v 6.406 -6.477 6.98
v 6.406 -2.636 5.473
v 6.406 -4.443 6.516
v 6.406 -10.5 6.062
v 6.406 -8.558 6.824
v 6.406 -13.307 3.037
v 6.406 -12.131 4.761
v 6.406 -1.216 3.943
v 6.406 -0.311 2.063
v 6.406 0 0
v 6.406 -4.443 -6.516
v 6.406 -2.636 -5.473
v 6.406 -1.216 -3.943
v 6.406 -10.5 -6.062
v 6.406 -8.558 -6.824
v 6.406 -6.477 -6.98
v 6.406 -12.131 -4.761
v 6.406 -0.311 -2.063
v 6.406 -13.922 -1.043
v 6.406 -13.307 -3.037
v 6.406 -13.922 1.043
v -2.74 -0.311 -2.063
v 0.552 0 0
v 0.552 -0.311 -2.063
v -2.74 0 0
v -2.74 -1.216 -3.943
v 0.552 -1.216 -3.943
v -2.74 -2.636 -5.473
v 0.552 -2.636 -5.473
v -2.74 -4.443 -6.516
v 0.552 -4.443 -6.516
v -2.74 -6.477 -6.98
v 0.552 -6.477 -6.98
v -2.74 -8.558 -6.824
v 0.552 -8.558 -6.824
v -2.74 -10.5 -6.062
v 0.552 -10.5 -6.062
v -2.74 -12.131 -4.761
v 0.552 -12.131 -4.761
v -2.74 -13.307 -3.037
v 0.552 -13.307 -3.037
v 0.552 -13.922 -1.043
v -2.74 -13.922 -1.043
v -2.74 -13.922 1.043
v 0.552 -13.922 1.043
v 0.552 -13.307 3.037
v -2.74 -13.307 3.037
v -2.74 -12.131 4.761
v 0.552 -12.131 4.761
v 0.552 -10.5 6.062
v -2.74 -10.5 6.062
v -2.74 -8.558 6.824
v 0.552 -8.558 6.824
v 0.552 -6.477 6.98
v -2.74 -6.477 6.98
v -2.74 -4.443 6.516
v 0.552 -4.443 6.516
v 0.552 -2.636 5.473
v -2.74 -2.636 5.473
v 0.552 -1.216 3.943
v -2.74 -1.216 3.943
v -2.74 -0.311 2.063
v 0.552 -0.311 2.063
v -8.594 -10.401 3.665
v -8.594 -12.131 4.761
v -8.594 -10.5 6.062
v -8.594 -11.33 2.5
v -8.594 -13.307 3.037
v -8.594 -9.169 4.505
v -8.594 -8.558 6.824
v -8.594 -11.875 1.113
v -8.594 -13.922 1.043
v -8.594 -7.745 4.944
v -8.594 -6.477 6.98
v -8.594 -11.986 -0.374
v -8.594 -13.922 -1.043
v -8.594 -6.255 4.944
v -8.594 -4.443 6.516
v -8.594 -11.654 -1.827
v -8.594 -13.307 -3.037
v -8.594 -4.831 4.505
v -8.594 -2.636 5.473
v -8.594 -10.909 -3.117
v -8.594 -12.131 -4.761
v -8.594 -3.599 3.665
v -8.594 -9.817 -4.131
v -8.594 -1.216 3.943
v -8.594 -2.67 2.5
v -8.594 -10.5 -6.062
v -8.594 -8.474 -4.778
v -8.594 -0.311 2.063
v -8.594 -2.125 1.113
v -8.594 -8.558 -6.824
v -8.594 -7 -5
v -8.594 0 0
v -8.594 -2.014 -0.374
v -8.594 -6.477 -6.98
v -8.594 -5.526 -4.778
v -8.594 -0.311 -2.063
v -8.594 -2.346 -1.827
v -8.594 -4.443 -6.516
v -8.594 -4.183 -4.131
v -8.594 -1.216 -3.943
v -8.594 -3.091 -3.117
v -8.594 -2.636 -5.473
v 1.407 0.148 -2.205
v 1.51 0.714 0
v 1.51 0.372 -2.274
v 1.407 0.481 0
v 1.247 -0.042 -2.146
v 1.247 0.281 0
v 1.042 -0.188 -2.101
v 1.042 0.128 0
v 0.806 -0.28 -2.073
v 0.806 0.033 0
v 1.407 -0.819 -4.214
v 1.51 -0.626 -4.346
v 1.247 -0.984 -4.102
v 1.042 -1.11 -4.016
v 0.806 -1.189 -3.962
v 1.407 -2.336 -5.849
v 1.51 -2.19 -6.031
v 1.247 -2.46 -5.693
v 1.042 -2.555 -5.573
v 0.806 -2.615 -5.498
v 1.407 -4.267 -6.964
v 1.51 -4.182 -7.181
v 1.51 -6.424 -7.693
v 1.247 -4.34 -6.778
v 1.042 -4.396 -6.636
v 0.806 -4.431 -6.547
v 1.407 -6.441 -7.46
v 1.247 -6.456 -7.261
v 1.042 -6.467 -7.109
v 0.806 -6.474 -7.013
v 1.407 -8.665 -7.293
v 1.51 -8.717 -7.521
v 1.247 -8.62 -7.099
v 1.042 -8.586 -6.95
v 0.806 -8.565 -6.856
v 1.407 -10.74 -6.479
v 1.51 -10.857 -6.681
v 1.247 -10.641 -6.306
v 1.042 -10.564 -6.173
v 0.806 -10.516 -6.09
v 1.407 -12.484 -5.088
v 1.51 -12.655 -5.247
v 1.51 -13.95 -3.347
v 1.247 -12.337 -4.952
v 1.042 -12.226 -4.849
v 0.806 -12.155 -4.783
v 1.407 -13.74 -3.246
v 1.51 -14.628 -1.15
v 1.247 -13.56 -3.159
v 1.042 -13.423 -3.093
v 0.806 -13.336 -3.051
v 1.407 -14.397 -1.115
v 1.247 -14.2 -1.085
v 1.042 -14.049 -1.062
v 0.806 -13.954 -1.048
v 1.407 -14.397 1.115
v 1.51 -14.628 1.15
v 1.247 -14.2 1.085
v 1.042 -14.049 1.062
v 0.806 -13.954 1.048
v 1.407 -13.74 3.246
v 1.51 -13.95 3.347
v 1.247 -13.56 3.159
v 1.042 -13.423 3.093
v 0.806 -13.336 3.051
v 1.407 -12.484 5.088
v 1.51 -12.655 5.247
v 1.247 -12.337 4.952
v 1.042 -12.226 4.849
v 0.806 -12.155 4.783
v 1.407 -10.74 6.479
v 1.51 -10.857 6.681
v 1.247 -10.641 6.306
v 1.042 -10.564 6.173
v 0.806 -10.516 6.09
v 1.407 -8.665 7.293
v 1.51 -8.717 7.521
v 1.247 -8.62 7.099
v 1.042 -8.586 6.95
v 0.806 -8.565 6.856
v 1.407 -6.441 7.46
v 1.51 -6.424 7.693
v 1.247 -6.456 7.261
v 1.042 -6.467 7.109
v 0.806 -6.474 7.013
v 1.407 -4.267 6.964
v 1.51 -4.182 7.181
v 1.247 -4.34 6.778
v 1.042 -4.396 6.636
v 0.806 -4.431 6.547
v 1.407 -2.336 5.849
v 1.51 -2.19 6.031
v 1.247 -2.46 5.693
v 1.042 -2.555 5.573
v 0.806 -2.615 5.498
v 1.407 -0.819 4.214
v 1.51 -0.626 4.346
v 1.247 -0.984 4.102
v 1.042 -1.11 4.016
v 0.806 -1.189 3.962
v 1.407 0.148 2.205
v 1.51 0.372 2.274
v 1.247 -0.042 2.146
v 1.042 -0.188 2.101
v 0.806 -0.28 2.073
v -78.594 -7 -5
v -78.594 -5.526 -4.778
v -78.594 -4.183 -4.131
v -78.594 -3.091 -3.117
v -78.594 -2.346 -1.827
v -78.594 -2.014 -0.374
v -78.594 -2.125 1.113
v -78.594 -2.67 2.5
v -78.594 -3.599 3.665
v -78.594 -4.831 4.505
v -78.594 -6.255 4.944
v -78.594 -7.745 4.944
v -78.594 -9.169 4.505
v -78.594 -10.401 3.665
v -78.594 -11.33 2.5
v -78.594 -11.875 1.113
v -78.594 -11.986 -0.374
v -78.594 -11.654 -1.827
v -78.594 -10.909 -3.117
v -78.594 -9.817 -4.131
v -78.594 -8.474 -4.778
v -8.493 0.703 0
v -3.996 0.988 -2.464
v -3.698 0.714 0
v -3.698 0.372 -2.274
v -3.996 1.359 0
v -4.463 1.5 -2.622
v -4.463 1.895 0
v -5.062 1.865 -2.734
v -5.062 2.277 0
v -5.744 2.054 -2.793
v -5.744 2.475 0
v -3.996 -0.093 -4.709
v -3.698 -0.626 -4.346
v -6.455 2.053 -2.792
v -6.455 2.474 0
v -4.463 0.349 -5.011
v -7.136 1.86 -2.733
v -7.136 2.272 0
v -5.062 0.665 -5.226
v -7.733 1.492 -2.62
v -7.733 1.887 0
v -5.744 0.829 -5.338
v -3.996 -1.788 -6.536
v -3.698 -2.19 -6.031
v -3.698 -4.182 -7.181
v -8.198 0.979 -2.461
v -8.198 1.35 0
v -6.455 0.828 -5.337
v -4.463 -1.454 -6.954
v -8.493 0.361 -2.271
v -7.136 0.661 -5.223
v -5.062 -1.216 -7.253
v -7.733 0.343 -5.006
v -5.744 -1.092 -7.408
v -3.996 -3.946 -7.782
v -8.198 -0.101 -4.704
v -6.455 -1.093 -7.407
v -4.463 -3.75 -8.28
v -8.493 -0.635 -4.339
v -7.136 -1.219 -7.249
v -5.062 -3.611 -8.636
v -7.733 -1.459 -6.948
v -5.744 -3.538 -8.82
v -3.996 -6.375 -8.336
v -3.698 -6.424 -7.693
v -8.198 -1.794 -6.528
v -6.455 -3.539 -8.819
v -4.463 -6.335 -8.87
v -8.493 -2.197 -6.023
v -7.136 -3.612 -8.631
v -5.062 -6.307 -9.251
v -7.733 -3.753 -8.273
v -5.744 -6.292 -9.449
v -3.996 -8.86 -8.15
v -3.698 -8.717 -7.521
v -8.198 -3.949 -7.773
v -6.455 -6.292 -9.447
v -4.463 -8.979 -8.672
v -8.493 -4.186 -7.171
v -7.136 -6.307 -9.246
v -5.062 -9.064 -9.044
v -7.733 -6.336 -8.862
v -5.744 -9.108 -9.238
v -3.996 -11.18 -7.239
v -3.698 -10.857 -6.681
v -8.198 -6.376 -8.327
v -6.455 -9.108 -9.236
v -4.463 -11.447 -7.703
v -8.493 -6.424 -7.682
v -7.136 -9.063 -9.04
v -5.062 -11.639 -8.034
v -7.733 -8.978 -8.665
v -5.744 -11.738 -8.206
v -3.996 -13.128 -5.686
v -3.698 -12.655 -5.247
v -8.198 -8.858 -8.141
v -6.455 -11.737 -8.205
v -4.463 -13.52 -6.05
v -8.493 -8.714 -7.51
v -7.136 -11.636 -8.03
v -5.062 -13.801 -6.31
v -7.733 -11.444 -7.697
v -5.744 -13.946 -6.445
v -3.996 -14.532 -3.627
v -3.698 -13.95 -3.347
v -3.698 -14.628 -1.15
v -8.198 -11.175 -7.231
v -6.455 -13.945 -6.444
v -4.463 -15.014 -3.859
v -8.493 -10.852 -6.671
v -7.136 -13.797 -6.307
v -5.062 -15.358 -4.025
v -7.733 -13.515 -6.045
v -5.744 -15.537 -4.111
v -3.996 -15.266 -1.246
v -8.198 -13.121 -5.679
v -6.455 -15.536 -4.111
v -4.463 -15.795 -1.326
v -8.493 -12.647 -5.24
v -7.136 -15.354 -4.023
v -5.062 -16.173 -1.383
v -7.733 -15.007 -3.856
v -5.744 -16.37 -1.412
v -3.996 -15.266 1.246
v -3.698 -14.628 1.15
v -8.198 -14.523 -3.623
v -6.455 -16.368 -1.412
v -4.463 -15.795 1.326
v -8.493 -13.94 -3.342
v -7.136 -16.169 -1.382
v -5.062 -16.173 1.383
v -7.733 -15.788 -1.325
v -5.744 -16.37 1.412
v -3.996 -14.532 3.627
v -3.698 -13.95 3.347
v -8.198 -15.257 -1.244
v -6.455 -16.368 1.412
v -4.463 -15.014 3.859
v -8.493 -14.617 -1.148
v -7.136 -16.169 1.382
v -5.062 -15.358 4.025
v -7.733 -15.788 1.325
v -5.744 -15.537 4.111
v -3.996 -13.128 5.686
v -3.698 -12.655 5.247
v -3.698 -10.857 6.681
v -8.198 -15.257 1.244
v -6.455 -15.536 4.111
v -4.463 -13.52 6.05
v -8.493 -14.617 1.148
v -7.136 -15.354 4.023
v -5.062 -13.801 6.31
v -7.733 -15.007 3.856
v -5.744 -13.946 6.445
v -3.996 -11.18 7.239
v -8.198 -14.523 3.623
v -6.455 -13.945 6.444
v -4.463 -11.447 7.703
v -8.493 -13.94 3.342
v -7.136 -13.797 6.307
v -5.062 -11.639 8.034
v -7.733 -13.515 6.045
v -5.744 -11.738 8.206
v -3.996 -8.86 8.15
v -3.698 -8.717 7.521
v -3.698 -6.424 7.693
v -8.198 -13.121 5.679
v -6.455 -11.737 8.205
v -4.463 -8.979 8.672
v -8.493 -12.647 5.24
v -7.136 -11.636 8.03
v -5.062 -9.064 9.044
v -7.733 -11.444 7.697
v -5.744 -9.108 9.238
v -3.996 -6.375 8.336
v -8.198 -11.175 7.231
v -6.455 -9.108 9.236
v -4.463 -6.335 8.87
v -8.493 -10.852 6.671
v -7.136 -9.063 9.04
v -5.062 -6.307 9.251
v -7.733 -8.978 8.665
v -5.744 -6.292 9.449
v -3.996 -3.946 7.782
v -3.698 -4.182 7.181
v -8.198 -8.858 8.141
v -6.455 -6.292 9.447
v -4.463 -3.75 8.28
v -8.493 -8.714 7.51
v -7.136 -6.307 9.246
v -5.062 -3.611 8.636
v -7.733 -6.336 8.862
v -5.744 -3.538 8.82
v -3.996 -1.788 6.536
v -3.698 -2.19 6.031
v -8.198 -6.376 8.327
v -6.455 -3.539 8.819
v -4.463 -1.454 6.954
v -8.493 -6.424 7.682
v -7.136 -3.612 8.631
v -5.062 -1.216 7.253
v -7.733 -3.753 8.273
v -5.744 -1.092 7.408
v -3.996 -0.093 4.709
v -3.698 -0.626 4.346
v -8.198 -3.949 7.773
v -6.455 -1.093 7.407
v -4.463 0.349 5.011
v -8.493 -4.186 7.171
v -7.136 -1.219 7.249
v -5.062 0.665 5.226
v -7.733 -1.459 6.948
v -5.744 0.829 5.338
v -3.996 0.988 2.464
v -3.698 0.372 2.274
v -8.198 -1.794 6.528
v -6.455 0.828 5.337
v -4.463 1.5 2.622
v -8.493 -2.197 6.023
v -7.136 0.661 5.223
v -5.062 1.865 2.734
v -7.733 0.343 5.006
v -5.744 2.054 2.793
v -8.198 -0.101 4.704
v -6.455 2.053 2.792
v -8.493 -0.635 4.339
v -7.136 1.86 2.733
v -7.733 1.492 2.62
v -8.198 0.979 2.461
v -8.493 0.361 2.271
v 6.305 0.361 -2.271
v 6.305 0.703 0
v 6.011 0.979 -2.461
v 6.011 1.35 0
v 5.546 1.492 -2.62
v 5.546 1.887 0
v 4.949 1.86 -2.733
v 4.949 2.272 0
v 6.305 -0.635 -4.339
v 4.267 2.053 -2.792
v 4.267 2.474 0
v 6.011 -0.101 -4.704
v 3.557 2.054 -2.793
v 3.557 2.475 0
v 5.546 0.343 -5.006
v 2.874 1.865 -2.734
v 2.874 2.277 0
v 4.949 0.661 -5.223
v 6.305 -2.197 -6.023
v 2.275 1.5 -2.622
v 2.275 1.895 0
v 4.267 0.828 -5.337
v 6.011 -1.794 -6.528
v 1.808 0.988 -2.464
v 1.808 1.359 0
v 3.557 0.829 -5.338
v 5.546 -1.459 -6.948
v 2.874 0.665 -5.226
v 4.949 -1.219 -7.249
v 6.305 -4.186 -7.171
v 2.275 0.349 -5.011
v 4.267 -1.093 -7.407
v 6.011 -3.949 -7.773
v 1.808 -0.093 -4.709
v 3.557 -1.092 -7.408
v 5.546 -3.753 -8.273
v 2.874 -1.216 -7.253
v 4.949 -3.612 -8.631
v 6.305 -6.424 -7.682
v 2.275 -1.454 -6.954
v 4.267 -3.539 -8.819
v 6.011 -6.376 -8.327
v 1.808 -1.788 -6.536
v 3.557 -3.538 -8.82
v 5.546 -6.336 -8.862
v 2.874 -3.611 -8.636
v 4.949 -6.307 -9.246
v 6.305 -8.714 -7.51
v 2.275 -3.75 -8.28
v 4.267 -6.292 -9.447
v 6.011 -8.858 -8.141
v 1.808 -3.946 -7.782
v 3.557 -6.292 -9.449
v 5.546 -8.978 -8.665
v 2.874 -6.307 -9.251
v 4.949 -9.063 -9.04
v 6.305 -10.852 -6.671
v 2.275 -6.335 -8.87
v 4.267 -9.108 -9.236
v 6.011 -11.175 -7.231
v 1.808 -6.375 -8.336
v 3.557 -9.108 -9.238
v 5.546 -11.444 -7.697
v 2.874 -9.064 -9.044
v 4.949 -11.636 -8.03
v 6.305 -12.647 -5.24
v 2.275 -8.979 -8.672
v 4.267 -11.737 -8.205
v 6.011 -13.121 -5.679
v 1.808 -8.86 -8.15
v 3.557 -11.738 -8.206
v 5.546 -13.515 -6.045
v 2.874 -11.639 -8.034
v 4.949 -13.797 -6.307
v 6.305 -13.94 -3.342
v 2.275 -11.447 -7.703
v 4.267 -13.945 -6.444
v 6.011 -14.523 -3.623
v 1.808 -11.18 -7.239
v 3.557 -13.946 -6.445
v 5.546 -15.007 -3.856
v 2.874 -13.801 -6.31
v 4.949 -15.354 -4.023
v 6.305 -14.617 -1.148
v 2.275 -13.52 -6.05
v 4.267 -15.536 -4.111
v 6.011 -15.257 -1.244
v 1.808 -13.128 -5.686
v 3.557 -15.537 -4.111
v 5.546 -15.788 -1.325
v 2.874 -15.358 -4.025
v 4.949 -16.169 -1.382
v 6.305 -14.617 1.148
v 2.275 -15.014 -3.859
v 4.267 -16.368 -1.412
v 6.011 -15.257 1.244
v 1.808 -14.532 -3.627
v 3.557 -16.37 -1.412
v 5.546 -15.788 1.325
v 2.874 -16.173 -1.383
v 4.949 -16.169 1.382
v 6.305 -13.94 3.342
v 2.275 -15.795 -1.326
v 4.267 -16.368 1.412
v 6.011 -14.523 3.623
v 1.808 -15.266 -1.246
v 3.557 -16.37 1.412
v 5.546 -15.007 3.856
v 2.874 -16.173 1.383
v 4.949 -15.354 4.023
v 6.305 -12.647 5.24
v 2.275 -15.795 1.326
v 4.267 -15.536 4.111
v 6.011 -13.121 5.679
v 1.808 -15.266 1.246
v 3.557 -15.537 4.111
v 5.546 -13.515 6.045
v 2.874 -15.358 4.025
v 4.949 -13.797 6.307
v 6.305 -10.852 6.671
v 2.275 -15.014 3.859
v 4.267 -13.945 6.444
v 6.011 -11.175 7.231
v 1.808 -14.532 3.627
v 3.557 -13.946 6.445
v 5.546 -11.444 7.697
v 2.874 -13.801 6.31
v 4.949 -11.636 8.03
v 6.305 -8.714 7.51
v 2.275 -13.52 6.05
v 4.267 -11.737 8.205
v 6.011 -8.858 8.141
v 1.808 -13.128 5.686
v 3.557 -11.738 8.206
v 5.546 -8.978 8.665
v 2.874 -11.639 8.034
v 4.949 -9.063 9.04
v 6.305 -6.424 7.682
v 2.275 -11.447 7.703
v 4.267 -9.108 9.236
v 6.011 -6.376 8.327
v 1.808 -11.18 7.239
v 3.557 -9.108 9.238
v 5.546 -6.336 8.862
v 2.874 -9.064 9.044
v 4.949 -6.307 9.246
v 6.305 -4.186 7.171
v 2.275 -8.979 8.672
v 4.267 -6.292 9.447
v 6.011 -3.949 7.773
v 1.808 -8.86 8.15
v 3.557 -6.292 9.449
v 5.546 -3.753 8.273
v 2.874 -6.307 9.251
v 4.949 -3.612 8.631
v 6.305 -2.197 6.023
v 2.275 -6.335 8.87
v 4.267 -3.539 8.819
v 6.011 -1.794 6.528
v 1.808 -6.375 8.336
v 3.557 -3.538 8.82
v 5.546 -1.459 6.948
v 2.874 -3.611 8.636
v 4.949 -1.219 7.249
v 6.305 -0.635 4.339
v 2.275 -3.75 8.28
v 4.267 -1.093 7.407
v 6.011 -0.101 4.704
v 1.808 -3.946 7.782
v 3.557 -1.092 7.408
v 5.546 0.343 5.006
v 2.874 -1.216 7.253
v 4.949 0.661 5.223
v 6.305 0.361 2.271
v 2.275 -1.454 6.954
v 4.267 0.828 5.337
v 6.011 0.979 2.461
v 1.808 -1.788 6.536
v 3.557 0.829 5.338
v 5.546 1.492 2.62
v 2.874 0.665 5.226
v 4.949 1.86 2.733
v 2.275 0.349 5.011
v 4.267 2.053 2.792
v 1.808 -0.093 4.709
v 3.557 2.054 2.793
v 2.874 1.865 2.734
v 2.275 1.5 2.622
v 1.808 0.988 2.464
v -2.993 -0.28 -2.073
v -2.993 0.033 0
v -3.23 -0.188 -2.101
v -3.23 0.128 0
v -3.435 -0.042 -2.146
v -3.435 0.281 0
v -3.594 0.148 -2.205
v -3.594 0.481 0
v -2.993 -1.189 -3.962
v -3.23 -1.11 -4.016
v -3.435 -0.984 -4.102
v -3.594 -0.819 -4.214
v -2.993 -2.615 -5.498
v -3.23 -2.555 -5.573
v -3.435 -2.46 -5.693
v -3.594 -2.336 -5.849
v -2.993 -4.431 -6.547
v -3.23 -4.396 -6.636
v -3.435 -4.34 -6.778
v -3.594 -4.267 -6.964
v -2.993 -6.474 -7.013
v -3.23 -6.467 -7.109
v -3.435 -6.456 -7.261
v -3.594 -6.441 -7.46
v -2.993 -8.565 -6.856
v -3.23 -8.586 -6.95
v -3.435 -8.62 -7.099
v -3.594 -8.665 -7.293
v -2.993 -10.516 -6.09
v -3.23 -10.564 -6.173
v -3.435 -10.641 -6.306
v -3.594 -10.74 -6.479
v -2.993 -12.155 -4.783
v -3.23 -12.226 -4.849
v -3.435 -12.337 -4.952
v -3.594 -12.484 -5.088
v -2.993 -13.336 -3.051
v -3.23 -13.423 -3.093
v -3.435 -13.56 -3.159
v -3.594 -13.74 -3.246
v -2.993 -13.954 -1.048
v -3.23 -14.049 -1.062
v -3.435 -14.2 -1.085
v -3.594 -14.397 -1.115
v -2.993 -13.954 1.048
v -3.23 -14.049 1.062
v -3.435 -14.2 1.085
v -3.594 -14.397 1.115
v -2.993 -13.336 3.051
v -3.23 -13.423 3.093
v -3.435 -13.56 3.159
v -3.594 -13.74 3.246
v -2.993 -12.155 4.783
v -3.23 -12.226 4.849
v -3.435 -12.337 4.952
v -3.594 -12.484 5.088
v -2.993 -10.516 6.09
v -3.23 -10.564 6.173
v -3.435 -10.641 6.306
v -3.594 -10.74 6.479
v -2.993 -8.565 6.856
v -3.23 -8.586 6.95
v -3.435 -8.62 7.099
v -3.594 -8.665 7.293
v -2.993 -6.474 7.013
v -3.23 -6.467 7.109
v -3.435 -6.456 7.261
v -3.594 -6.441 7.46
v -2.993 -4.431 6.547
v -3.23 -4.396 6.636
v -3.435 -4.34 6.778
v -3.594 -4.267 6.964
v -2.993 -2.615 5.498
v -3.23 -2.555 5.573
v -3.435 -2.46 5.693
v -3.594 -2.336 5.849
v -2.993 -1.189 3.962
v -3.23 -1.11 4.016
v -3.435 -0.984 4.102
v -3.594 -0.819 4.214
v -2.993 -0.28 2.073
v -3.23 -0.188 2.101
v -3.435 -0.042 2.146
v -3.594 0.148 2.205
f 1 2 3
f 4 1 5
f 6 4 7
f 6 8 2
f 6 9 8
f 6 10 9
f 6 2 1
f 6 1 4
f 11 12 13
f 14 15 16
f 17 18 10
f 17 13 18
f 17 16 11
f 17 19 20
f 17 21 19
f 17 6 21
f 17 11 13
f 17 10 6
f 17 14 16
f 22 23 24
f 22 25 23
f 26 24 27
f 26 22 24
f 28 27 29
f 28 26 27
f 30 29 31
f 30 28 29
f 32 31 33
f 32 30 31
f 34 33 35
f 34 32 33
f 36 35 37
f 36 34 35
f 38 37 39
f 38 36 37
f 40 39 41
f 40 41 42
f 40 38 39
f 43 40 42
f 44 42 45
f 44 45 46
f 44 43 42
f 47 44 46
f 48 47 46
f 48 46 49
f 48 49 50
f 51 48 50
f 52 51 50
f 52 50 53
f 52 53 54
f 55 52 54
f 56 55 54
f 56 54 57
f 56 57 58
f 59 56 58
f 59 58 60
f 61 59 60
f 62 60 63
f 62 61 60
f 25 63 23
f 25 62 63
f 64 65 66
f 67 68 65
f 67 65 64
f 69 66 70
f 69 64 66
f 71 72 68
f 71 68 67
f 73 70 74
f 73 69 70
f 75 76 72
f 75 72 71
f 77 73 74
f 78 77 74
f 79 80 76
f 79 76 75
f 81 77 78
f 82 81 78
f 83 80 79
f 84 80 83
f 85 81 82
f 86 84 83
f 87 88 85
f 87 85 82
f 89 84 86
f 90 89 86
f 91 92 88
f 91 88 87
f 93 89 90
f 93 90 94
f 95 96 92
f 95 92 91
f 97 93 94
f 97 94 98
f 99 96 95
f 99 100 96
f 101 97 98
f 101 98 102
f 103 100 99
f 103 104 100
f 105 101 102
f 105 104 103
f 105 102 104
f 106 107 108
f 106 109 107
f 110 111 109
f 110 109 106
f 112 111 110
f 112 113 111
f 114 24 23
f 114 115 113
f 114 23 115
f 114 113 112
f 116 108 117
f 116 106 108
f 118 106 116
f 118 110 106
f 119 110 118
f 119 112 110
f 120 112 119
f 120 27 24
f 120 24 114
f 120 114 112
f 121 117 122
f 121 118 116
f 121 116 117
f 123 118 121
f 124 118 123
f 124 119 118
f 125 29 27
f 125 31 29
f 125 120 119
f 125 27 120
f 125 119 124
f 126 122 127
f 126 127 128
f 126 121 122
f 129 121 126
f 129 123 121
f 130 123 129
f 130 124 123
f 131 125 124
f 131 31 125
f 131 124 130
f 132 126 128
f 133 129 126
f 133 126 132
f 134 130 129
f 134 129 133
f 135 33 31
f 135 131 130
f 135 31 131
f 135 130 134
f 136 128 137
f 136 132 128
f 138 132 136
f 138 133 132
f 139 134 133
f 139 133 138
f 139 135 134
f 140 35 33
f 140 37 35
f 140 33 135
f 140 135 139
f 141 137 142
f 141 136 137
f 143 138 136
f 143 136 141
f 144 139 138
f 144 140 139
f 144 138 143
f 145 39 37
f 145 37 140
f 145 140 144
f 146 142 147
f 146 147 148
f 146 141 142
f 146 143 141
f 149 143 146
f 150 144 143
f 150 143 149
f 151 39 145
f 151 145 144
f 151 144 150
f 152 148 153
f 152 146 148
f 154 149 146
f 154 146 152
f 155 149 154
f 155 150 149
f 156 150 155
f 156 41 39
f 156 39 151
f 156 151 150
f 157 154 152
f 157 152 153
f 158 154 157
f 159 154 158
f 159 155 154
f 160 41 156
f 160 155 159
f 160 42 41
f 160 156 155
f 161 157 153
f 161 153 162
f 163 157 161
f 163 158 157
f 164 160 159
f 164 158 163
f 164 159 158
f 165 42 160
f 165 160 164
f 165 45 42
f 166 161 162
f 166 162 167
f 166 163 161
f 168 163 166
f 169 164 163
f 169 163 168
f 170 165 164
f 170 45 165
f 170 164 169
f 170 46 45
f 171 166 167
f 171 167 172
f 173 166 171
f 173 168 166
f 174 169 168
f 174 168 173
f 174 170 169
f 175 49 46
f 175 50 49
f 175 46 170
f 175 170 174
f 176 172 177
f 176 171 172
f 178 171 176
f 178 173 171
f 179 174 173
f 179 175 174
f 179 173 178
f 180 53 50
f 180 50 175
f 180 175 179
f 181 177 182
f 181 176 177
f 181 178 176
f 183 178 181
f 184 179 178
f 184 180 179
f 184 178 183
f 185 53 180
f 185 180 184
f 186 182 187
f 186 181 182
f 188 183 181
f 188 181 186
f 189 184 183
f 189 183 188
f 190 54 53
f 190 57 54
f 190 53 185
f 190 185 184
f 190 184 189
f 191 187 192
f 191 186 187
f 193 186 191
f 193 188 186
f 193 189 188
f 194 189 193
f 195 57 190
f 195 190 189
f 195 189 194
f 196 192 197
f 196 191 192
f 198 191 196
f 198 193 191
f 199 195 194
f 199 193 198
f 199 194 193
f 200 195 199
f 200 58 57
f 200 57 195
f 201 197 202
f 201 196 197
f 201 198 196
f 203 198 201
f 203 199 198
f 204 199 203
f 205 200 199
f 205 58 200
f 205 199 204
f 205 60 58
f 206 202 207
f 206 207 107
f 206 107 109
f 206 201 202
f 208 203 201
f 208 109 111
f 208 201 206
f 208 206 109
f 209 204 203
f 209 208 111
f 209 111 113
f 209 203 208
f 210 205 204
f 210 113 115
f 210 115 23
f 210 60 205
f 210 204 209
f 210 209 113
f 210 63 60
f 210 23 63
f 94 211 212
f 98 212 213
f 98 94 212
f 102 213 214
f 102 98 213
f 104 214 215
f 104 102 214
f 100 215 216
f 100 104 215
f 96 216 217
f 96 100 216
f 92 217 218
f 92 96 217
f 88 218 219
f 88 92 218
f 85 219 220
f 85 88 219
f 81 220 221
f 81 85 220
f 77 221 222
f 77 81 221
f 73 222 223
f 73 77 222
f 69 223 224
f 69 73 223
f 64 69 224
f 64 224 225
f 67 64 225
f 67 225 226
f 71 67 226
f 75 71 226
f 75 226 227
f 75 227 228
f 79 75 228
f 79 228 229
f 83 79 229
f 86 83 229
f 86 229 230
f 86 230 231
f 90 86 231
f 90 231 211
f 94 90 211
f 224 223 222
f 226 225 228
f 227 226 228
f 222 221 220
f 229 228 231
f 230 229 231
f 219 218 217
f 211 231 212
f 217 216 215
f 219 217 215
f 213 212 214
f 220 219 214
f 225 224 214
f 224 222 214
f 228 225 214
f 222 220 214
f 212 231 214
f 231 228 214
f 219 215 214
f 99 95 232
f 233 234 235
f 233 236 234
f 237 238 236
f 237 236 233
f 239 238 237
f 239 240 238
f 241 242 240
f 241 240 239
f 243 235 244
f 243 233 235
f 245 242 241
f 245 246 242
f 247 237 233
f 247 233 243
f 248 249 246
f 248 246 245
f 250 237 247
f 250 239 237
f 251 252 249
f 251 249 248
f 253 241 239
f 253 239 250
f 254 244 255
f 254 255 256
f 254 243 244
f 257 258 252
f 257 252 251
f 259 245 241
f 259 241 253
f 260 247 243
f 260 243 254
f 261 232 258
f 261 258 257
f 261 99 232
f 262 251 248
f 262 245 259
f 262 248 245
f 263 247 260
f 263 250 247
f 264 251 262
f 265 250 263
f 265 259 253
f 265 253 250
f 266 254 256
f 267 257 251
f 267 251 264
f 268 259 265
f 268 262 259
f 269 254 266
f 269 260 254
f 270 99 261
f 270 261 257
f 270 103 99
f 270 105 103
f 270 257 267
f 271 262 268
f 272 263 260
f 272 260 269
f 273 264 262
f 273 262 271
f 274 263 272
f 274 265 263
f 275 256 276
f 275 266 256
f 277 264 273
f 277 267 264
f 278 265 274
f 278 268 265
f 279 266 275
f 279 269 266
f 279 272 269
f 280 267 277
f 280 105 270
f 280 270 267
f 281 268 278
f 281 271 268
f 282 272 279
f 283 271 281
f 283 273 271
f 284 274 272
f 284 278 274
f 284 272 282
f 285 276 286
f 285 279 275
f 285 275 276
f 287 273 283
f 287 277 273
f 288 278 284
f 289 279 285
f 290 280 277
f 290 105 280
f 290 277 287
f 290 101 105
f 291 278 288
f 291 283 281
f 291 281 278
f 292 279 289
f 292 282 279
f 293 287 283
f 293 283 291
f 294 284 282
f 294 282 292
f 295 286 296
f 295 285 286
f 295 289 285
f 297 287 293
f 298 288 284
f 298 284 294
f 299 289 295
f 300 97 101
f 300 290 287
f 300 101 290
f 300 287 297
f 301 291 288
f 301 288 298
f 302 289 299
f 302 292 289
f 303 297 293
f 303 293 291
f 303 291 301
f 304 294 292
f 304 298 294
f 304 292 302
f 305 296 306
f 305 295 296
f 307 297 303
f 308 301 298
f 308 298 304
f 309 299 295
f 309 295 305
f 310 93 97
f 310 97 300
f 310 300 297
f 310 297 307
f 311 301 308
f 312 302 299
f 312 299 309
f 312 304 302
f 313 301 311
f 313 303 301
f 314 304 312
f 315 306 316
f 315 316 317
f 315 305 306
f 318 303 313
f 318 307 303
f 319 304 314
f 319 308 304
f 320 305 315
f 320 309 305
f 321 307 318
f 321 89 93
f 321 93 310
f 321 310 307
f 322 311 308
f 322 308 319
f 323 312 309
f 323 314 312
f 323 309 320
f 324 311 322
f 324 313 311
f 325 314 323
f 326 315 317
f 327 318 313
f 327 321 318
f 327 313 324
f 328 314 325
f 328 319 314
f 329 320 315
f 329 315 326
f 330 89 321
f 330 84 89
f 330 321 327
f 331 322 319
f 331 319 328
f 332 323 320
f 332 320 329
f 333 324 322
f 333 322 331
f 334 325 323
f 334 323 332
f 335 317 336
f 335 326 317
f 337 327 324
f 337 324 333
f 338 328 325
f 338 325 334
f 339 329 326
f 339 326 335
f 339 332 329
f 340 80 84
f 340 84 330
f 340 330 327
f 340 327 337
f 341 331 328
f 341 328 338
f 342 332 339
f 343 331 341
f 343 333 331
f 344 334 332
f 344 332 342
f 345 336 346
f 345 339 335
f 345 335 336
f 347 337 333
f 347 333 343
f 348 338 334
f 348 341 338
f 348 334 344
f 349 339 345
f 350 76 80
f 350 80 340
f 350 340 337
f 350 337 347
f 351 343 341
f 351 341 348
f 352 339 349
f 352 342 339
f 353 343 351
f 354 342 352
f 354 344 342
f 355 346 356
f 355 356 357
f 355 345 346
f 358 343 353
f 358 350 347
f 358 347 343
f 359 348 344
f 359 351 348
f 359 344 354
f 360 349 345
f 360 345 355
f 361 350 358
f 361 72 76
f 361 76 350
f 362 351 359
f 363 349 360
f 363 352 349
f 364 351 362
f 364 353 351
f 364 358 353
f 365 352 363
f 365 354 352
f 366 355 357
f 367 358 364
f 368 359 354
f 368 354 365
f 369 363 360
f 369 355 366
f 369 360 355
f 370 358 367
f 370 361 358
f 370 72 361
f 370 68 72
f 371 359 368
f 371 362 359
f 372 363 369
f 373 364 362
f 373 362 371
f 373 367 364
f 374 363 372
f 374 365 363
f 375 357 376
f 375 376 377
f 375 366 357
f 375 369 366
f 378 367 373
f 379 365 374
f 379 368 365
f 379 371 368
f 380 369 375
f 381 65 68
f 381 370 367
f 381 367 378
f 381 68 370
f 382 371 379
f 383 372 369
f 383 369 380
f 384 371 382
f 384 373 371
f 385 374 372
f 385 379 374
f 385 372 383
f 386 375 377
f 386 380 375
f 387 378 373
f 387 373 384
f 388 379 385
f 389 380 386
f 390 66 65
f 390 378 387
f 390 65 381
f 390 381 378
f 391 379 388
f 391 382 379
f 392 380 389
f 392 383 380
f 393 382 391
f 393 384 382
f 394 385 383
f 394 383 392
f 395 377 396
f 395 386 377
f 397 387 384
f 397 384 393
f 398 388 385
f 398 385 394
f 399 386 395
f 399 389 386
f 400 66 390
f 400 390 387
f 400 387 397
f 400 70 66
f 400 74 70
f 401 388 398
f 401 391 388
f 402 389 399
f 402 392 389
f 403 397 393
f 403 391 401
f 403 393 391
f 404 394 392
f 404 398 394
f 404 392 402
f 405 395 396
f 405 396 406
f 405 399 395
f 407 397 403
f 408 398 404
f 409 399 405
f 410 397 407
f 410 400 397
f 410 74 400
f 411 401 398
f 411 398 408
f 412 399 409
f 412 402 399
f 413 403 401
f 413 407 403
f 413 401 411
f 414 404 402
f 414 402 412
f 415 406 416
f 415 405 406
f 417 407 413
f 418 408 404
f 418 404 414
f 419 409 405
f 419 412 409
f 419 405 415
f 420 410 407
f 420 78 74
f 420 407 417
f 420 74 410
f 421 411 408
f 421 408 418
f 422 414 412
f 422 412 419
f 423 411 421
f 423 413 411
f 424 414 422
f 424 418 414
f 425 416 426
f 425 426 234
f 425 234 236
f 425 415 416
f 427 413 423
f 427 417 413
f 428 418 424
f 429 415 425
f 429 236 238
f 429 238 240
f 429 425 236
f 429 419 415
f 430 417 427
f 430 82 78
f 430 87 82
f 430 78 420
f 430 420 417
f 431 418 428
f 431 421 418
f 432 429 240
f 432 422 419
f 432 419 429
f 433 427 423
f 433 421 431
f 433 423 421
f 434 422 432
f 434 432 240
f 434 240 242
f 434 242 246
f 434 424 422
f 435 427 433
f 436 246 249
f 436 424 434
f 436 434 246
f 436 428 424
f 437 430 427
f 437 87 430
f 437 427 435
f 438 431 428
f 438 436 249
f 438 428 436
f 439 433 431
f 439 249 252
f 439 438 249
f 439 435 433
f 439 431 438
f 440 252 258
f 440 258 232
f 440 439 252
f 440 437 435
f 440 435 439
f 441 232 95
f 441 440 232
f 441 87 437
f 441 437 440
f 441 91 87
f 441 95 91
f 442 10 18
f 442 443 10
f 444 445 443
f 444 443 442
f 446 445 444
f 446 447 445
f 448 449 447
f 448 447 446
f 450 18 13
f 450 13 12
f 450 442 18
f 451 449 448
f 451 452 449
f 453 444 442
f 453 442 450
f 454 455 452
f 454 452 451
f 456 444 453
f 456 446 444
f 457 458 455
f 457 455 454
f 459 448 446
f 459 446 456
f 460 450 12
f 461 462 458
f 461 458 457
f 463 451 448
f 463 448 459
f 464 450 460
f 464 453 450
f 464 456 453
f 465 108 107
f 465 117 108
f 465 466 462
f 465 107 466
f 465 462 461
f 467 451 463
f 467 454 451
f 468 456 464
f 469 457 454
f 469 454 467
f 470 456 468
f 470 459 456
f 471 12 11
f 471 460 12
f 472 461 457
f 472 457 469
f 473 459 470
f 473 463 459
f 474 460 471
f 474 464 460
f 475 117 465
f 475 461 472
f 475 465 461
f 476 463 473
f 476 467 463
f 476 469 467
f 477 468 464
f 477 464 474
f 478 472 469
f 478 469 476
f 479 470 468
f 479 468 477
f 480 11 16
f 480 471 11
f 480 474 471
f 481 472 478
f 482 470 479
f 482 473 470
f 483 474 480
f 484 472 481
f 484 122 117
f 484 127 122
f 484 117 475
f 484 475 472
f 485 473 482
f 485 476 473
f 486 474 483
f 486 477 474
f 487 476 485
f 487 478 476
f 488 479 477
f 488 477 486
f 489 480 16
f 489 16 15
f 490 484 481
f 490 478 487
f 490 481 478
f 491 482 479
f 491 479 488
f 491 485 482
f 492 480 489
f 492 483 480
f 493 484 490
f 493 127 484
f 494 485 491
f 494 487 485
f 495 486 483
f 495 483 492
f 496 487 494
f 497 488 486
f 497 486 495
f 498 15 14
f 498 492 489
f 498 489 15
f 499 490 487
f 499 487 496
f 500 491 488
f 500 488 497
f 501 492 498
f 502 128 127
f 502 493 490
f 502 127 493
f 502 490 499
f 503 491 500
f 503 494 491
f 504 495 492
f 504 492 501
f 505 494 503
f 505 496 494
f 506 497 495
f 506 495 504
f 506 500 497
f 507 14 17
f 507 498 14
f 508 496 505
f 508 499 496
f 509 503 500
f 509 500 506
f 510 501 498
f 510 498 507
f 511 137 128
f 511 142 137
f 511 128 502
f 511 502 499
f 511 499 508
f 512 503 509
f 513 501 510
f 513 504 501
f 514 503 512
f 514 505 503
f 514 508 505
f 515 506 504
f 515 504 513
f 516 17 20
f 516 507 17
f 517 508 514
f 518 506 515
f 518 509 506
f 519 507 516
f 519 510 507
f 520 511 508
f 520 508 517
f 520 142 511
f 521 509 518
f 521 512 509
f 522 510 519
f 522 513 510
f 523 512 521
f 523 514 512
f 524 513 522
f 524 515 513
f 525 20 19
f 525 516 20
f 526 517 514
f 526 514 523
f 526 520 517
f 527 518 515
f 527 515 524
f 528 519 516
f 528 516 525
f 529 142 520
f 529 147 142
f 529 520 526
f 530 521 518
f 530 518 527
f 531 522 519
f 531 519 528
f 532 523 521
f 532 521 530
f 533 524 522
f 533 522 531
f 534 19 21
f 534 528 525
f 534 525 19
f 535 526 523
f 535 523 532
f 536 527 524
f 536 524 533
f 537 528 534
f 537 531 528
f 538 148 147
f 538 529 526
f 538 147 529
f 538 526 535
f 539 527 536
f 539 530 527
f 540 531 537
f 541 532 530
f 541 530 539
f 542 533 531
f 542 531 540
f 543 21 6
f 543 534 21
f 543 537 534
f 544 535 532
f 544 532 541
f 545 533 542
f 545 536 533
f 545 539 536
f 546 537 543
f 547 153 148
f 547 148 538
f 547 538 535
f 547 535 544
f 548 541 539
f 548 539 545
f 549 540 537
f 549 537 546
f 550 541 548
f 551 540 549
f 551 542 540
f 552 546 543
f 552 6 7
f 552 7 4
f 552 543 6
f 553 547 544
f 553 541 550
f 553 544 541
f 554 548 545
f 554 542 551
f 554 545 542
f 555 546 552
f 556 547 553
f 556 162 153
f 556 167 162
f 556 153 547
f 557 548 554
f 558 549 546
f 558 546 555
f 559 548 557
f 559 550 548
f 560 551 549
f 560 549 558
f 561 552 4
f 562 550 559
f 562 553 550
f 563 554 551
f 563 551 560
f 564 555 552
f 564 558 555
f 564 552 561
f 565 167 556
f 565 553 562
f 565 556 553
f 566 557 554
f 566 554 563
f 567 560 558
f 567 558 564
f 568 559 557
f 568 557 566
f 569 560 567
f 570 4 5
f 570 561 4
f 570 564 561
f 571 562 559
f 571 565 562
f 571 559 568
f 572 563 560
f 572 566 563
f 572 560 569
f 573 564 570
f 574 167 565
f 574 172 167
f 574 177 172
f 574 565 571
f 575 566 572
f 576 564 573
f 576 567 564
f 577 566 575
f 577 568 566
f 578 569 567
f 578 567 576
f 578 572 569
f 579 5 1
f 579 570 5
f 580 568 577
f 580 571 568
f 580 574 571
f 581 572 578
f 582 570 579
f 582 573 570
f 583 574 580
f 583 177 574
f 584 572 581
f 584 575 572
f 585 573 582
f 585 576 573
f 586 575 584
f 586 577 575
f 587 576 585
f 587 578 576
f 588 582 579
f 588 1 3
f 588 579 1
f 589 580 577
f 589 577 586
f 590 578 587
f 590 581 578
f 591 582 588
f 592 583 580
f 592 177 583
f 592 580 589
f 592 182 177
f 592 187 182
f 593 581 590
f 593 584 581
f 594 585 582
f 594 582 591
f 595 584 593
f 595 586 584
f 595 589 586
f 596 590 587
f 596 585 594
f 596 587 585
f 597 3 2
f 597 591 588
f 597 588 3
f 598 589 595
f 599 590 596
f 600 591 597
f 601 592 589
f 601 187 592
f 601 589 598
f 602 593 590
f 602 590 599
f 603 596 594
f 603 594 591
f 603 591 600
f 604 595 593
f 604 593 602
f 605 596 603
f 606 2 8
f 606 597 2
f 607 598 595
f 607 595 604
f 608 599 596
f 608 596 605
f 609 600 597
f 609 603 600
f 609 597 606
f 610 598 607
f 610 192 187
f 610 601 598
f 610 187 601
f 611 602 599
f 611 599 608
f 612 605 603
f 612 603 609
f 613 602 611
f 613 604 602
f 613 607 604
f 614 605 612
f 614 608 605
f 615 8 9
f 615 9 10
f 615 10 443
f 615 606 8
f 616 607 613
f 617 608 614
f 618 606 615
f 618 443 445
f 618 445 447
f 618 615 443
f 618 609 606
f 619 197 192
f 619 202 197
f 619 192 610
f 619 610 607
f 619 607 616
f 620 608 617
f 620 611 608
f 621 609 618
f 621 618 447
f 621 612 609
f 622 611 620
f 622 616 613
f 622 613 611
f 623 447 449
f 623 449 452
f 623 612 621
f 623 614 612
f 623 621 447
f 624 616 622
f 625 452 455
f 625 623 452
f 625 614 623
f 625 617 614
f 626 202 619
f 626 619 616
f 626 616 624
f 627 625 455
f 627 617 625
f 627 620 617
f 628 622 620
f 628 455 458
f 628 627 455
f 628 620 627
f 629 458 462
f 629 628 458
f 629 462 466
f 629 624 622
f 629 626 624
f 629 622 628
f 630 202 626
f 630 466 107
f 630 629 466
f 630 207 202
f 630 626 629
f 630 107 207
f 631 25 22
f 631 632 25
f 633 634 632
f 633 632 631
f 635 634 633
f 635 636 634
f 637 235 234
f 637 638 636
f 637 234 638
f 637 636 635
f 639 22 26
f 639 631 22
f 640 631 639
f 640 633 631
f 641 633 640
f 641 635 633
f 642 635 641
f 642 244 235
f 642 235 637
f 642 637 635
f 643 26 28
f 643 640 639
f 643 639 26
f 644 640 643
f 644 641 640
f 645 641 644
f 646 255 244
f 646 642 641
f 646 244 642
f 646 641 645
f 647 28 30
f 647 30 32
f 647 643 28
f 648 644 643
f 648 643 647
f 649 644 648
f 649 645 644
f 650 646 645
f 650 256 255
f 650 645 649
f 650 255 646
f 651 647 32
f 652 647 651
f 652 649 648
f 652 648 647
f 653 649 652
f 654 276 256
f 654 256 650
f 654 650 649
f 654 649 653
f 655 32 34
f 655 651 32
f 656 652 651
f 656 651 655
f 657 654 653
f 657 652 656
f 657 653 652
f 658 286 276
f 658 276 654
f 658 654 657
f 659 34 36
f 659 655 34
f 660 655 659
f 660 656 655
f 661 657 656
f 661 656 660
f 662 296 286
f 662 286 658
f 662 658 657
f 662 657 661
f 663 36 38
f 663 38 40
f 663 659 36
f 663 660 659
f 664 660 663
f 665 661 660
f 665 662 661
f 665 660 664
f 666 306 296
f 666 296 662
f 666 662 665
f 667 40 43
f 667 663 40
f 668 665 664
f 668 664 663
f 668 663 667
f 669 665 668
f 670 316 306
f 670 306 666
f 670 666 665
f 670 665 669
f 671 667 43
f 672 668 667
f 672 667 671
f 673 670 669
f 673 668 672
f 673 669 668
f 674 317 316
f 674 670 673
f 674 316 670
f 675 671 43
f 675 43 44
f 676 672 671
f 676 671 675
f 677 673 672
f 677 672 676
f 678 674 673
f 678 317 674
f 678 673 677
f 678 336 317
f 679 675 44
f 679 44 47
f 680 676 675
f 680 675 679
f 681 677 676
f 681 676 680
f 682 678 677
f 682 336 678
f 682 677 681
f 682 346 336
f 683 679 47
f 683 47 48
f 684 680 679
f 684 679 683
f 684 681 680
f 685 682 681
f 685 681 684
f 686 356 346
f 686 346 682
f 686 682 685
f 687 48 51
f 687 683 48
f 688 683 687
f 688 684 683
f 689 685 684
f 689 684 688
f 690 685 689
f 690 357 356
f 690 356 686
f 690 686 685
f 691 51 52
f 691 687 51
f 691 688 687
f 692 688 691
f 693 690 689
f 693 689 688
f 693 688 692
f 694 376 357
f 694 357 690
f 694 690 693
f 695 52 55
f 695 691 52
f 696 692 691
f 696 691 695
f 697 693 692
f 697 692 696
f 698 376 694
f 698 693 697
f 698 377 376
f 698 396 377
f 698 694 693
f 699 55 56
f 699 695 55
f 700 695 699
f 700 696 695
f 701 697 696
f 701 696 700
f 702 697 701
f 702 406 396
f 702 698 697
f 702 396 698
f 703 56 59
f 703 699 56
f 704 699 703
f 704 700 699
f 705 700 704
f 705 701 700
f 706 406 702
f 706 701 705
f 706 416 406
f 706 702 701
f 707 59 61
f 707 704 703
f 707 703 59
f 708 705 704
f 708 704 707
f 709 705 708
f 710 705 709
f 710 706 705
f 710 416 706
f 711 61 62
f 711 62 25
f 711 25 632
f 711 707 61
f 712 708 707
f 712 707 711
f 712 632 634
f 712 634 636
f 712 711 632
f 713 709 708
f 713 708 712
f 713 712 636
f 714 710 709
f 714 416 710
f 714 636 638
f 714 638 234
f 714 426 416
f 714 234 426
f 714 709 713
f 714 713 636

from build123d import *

# Parameters (mm, degrees)
SKETCH2_R           = 5
BOSS_EXTRUDE1_DEPTH = 85


with BuildPart() as part:
    # Sketch1 → Revolve2 (revolve)
    with BuildSketch(Plane.XY):
        with BuildLine():
            ThreePointArc((6.40625, 0), (4.267173955, 2.473809592), (1.510462881, 0.714285714))
            ThreePointArc((1.510462881, 0.714285714), (1.149762338, 0.198216274), (0.552148034, 0))
            Line((0.552148034, 0), (-2.739648034, 0))
            ThreePointArc((-2.739648034, 0), (-3.337262338, 0.198216274), (-3.697962881, 0.714285714))
            ThreePointArc((-3.697962881, 0.714285714), (-6.454673955, 2.473809592), (-8.59375, 0))
            Line((-8.59375, 0), (-8.59375, -2))
            Line((-8.59375, -2), (6.40625, -2))
            Line((6.40625, -2), (6.40625, 0))
        make_face()
    revolve(axis=Axis((11.035645008, -7, 0), (-1, 0, 0)))

    # Sketch2 → Boss-Extrude1 (add)
    with BuildSketch(Plane(origin=(6.40625, 0, 0), x_dir=(0, 0, -1), z_dir=(1, 0, 0))):
        with Locations((0, -7)):
            Circle(SKETCH2_R)
    extrude(amount=-BOSS_EXTRUDE1_DEPTH)


solid = part.part
